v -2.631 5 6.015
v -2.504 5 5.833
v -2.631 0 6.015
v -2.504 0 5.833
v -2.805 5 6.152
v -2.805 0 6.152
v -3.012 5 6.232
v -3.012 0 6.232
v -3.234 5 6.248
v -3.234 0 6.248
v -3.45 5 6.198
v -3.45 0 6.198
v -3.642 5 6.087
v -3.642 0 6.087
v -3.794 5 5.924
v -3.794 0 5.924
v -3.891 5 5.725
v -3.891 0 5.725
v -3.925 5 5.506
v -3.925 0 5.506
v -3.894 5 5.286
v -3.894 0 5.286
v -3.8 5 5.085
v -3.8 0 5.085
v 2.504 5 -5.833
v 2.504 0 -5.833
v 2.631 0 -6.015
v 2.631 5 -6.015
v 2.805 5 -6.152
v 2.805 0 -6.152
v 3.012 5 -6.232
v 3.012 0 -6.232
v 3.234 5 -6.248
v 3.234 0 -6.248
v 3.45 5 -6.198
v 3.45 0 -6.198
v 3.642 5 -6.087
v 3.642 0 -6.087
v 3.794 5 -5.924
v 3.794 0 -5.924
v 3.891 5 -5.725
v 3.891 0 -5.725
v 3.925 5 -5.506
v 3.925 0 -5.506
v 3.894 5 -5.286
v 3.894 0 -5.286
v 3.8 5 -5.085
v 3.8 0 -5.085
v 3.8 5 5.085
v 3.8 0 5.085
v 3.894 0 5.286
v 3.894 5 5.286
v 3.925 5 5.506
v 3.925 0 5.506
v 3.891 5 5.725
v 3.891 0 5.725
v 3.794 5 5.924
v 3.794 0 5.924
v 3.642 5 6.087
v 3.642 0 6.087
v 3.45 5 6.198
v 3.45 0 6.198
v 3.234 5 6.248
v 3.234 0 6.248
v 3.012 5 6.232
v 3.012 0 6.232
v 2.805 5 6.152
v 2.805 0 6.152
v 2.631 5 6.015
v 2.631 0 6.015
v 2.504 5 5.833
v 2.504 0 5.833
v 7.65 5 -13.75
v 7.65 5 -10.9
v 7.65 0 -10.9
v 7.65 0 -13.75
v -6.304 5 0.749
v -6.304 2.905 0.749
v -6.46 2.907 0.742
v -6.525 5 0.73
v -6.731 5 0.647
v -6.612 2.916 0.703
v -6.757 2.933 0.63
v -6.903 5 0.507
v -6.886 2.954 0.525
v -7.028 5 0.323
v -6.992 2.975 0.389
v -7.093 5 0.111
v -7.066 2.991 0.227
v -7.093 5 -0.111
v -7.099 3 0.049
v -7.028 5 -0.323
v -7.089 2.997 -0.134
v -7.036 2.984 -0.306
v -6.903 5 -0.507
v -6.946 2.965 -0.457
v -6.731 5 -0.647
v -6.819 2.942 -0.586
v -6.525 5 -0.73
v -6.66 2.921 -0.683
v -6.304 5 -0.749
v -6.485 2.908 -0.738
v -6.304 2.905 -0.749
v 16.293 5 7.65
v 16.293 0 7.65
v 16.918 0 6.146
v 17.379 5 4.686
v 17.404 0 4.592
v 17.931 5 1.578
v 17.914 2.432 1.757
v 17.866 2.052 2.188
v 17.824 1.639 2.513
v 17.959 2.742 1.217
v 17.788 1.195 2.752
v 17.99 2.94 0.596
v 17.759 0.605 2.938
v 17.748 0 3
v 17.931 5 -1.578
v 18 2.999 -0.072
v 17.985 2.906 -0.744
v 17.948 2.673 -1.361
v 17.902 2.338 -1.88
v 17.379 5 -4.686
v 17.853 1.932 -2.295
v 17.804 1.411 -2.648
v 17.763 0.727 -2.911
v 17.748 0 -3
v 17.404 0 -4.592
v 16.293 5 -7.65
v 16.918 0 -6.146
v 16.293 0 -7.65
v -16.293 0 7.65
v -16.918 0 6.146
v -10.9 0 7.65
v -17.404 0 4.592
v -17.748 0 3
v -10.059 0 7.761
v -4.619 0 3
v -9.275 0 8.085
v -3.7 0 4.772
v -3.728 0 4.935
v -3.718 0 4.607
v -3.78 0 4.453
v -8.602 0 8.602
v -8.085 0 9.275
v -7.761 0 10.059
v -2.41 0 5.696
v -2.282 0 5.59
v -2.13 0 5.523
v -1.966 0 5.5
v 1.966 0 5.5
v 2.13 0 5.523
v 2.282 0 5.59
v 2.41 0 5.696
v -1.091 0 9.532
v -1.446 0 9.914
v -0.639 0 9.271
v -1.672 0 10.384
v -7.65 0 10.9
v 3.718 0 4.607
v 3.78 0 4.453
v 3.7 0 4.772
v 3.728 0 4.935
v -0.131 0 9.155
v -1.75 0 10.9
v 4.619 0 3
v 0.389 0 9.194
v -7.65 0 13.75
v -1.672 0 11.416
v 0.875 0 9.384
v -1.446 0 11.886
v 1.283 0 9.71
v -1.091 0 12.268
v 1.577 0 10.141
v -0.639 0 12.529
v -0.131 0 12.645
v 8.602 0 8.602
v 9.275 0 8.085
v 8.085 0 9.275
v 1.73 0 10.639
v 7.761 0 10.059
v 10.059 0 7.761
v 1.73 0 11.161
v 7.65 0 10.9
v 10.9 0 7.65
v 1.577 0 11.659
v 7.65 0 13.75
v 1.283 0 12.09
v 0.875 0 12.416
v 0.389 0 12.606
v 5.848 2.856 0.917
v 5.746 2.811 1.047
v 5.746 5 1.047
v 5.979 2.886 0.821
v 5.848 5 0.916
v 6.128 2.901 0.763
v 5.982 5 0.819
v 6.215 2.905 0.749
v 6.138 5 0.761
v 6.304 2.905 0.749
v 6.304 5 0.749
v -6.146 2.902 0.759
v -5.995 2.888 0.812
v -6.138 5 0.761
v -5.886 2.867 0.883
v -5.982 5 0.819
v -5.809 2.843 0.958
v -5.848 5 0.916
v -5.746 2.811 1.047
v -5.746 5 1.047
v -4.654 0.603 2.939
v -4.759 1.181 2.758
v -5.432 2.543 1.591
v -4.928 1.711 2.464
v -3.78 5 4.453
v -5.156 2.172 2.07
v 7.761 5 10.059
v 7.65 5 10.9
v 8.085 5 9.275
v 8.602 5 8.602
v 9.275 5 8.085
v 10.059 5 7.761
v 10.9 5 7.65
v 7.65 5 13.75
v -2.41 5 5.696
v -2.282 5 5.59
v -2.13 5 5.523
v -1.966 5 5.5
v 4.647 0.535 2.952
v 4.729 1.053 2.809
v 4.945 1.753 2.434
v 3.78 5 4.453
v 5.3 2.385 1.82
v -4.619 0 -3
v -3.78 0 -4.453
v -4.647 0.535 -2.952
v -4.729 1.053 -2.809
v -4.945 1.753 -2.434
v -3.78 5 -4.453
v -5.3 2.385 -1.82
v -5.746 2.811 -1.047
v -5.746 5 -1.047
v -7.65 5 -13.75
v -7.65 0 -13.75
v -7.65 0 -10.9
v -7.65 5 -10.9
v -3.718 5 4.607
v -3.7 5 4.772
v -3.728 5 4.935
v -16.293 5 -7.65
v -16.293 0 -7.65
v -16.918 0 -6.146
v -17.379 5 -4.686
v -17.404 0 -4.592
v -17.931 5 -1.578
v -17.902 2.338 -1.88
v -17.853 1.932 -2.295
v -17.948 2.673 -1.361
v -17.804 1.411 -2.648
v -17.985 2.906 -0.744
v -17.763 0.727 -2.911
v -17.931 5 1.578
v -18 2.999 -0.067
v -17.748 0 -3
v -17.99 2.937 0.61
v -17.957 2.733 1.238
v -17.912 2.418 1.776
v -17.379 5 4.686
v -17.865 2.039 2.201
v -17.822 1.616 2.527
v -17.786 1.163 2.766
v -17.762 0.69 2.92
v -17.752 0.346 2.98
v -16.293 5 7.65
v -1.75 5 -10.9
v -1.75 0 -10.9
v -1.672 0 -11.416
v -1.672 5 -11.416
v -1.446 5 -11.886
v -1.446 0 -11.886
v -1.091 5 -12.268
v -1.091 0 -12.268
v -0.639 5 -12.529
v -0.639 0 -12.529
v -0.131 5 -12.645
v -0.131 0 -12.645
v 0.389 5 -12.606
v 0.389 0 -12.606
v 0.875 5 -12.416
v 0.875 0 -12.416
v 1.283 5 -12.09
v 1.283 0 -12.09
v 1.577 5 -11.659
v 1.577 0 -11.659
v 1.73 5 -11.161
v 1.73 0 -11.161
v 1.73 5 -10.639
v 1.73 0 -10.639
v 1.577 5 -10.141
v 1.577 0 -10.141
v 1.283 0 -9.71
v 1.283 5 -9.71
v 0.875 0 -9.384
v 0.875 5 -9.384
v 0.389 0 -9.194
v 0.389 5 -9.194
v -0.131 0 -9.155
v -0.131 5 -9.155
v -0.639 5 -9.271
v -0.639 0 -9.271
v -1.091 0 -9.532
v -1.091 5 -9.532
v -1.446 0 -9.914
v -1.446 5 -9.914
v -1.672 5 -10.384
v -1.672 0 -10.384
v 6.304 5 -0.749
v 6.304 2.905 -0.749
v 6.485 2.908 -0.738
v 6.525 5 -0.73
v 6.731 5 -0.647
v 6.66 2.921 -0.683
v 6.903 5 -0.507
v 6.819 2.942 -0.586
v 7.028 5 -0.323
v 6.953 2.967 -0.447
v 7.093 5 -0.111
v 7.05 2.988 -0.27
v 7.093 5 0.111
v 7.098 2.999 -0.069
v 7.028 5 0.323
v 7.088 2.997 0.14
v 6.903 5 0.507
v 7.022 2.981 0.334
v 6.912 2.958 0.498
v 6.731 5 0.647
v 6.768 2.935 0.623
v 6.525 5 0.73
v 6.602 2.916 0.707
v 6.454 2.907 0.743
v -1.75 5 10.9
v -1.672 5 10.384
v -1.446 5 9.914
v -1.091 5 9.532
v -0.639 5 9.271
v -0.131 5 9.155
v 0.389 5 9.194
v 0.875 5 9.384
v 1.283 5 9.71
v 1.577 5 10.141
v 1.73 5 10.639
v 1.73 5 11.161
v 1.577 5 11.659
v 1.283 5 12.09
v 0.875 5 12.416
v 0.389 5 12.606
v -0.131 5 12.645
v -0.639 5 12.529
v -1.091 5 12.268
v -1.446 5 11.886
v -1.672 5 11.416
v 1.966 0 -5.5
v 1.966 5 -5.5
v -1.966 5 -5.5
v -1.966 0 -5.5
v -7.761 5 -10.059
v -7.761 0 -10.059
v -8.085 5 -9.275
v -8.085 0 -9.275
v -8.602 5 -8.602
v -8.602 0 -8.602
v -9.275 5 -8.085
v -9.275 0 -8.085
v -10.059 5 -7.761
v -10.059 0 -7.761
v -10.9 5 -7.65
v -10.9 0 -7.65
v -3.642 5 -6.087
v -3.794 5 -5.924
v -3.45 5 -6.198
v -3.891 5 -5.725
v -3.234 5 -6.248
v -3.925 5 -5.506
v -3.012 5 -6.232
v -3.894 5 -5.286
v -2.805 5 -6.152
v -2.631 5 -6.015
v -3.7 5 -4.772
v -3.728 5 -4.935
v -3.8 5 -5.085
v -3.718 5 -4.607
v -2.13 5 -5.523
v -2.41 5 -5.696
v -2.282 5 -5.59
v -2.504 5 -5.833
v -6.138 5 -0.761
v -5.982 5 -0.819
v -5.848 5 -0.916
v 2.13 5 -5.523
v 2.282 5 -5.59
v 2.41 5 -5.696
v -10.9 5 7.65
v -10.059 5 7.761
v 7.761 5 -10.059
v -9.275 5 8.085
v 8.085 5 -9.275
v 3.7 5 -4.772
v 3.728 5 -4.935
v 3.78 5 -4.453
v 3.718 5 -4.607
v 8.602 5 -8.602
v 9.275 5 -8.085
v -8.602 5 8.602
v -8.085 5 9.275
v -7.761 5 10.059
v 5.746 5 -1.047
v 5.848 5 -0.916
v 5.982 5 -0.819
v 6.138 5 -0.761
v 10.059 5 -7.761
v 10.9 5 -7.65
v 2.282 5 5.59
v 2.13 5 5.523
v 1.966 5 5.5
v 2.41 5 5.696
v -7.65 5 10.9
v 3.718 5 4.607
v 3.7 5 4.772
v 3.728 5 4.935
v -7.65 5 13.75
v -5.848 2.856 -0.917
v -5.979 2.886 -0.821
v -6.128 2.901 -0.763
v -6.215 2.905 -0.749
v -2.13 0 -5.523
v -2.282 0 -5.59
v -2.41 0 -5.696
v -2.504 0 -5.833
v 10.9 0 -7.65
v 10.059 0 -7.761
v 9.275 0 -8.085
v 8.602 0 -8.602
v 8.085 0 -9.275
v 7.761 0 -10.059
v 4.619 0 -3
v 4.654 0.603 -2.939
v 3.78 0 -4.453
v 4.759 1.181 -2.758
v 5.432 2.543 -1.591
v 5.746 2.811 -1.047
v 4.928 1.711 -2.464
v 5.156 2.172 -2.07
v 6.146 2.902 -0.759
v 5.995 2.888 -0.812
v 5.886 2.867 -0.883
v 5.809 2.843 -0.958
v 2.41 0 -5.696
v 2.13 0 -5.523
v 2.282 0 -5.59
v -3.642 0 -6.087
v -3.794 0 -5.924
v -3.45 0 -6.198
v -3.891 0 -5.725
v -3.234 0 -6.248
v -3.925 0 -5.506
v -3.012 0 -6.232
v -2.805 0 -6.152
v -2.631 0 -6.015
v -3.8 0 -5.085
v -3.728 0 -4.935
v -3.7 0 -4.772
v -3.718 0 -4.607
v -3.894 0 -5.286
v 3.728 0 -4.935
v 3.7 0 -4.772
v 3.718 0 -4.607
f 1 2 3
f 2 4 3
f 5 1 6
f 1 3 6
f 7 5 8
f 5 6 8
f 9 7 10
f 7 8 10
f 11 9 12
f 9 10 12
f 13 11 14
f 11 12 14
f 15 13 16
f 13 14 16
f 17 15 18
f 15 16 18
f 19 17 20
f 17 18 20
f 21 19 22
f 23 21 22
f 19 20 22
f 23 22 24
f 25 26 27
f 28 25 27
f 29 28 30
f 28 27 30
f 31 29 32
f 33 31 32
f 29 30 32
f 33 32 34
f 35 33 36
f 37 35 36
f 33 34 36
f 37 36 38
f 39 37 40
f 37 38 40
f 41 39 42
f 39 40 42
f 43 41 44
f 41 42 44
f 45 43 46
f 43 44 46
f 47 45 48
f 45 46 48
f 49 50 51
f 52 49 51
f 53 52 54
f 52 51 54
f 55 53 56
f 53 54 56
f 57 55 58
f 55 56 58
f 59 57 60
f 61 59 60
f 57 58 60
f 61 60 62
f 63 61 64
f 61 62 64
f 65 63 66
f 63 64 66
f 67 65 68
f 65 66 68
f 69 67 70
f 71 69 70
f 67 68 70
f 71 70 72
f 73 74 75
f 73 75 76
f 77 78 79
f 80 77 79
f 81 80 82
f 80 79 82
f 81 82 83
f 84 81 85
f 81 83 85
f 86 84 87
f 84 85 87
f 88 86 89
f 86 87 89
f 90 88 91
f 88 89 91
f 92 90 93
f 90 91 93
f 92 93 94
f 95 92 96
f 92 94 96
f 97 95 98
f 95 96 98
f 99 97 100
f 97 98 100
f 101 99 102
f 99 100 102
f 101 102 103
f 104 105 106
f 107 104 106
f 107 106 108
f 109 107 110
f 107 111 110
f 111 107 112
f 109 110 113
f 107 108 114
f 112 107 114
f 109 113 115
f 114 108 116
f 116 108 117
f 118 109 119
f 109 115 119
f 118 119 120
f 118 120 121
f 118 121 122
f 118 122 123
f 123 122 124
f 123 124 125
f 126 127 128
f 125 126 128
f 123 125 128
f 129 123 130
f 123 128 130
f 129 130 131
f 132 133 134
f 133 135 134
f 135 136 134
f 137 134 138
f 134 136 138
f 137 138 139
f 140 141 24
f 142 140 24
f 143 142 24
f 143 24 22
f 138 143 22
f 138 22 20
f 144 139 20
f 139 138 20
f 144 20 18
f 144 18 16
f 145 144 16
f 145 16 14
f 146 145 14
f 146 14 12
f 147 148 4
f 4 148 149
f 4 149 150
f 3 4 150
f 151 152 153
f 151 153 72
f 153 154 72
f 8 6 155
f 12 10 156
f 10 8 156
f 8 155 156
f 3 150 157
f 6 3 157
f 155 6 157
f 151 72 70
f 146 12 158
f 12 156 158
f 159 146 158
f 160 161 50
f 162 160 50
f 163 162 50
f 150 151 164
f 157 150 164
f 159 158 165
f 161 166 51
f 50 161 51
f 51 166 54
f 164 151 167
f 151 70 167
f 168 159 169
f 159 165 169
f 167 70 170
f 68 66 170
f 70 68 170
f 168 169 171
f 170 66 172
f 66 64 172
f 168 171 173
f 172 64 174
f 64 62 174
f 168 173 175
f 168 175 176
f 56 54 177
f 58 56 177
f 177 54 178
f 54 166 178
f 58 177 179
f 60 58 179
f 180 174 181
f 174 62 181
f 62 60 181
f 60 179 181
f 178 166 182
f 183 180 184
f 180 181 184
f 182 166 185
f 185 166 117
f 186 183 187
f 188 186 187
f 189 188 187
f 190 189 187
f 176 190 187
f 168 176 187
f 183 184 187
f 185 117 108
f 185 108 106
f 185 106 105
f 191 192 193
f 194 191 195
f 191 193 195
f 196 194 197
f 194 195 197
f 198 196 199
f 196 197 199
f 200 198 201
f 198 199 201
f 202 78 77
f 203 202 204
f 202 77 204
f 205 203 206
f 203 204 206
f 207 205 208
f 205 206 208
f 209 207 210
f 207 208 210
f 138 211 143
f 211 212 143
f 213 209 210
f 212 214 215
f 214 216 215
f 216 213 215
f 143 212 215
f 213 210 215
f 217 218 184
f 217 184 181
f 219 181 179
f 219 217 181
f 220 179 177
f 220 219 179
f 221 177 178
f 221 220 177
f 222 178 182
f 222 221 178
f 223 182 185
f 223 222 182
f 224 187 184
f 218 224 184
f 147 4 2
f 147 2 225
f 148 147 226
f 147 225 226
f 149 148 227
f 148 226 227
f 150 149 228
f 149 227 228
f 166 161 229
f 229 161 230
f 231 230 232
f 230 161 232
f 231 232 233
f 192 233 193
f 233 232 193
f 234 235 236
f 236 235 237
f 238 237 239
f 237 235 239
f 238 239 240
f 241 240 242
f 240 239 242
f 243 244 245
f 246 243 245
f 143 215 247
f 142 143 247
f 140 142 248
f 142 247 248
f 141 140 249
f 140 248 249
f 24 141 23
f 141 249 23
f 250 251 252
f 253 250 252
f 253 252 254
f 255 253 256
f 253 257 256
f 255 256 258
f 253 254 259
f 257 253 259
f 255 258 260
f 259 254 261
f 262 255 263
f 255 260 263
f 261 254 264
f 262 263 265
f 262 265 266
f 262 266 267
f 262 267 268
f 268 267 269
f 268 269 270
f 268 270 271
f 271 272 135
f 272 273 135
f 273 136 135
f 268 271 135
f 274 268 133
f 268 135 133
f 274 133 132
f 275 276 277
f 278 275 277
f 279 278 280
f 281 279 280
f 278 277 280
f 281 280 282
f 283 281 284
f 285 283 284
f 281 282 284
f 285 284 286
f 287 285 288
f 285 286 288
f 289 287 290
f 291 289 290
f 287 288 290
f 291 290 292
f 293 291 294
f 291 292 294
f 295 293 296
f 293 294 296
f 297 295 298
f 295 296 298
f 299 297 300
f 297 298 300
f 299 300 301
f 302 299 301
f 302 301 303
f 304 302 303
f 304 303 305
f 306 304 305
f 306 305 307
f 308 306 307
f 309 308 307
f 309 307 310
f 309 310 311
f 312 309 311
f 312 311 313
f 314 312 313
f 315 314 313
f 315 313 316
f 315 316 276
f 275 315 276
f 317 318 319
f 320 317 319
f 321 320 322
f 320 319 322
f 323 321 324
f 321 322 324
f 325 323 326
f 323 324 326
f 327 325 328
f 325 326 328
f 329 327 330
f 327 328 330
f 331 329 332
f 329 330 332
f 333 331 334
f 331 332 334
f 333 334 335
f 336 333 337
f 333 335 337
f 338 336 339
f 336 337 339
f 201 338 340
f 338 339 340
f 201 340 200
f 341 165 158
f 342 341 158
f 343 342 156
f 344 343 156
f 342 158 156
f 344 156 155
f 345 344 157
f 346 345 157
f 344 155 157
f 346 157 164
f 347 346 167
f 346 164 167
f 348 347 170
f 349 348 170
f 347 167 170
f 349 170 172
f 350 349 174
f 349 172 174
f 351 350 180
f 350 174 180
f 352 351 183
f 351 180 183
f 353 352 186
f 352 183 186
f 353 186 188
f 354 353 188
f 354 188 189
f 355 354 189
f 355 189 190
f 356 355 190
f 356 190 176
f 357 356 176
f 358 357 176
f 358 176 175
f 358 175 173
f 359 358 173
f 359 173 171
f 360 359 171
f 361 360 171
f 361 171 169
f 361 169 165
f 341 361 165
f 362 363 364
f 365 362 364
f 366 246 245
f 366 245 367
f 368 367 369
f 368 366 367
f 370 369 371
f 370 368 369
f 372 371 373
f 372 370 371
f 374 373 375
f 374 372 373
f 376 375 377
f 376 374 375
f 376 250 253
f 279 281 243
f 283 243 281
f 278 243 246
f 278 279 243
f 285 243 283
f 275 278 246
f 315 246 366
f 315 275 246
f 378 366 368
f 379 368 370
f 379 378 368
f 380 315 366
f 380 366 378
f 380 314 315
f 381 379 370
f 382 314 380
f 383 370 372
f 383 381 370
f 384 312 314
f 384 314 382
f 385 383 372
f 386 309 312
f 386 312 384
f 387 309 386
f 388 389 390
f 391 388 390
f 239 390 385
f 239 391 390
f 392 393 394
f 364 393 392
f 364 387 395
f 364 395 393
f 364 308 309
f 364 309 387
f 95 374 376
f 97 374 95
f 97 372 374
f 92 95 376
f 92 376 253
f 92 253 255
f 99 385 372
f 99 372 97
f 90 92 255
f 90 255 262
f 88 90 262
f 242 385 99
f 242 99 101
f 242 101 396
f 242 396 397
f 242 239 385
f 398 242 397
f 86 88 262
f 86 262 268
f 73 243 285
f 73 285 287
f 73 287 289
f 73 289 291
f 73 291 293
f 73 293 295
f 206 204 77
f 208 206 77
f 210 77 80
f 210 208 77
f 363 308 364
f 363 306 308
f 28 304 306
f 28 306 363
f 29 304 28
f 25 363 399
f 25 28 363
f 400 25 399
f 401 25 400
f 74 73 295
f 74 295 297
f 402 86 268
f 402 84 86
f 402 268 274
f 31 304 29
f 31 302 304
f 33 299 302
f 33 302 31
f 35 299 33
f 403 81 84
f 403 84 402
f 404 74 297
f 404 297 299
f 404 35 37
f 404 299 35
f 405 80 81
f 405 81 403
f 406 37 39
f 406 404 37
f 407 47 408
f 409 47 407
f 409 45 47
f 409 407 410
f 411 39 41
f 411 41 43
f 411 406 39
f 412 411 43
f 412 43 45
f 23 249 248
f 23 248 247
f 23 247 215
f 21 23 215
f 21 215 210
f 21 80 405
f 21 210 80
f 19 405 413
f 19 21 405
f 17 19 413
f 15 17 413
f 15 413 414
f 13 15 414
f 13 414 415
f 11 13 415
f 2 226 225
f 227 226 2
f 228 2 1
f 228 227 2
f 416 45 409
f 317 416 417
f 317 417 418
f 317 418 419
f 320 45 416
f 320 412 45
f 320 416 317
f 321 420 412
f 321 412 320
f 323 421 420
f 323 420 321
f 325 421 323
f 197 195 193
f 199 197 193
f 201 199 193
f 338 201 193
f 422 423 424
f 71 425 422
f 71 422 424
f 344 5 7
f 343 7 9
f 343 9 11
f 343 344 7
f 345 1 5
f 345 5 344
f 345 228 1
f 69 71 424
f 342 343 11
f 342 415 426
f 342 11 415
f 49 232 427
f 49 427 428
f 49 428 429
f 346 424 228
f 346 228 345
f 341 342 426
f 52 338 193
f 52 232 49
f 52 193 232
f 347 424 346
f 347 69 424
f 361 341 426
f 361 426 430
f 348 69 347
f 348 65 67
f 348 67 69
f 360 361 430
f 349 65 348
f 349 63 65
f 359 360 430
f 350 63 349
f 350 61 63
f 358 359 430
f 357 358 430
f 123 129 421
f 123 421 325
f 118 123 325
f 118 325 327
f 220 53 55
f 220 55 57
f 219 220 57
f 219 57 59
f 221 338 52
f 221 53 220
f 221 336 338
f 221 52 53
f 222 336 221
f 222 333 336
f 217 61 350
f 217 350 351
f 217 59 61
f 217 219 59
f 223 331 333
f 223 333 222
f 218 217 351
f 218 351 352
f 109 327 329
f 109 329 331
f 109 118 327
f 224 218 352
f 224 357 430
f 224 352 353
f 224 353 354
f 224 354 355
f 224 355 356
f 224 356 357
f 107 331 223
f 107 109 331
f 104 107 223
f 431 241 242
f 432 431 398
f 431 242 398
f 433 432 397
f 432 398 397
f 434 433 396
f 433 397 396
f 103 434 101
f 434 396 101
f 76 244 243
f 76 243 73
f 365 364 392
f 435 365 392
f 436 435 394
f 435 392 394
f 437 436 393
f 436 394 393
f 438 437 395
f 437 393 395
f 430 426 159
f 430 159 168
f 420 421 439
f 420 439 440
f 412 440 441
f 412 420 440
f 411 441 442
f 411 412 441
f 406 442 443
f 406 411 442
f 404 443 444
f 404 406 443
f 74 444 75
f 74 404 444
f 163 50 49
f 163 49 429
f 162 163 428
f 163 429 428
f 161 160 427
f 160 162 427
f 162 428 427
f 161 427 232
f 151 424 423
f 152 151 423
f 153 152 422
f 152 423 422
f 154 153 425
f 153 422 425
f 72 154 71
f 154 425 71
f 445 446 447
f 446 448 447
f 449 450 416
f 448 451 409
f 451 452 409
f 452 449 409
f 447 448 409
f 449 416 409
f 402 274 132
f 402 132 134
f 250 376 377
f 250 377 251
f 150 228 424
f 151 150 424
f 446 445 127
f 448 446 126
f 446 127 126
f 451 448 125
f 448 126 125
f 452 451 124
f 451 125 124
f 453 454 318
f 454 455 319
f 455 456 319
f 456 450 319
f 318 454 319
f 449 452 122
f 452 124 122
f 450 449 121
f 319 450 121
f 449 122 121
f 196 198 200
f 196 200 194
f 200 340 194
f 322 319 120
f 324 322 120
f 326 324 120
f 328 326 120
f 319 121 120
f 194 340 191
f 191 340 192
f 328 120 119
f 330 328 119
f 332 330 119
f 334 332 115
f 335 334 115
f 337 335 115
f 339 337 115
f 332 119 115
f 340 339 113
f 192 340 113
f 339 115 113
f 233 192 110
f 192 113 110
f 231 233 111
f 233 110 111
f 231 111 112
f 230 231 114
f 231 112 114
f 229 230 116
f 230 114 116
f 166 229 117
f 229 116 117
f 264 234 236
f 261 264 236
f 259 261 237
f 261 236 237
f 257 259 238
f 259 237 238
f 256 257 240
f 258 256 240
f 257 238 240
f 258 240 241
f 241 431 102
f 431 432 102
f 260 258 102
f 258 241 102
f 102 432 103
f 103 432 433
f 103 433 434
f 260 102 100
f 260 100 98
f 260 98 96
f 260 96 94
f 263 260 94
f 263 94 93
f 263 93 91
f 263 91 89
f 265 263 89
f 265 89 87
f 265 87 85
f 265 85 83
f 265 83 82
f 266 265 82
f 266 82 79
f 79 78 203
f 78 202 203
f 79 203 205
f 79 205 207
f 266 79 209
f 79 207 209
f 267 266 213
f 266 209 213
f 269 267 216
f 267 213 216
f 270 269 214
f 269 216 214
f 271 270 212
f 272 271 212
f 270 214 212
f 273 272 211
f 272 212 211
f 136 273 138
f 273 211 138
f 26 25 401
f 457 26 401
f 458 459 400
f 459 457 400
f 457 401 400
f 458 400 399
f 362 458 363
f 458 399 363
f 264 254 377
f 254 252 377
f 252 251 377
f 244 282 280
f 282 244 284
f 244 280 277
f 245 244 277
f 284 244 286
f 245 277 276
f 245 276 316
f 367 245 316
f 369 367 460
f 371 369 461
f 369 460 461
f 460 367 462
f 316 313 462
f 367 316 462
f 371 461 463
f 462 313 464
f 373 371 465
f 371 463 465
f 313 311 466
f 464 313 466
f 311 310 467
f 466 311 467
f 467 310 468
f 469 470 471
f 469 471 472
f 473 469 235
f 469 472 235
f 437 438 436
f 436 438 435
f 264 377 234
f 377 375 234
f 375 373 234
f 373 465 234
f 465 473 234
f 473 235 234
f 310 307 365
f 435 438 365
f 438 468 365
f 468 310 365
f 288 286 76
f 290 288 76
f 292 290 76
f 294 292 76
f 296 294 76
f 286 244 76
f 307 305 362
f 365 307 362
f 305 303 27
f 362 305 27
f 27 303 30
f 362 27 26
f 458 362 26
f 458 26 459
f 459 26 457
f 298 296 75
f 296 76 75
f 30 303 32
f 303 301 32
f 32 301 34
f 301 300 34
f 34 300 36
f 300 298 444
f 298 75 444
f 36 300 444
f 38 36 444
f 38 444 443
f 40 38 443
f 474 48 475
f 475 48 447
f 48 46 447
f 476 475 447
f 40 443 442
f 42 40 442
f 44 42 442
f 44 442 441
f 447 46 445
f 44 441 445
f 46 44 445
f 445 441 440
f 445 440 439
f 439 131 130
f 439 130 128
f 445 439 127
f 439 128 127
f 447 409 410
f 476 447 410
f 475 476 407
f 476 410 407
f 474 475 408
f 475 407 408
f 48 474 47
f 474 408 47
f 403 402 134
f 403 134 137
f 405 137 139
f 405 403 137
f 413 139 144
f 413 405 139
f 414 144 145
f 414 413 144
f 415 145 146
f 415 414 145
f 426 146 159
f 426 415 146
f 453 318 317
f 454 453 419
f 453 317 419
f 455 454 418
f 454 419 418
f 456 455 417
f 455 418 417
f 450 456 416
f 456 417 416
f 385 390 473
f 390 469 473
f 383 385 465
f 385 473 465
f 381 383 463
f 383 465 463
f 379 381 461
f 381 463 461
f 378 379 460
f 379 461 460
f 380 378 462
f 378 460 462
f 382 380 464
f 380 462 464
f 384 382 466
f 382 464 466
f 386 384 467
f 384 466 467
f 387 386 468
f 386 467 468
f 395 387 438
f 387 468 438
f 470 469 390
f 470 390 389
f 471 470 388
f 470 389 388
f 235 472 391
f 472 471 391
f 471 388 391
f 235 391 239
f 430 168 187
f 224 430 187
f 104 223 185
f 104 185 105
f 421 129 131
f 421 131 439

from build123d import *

# Parameters (mm, degrees)
SKIZZE1_R                            = 18
AUFSATZ_LINEAR_AUSTRAGEN1_DEPTH      = 5
SCHNITT_LINEAR_AUSTRAGEN1_DEPTH      = 26.942243542
SCHNITT_LINEAR_AUSTRAGEN1_DEPTH_BACK = 26.942243542
SKIZZE2_OUTSIDE_W                    = 48.232
SKIZZE2_OUTSIDE_H                    = 48.232
SKIZZE2_OUTSIDE_W_2                  = 36
SKIZZE2_OUTSIDE_H_2                  = 27.5
F_3_5_3_5_DURCHMESSER_BOHRUNG1_D     = 3.5
SCHNITT_LINEAR_AUSTRAGEN2_DEPTH      = 24.196174254
SCHNITT_LINEAR_AUSTRAGEN3_DEPTH      = 24.196174254
SKIZZE7_R                            = 3
SCHNITT_LINEAR_AUSTRAGEN4_DEPTH      = 22.5
F_1_5_1_5_DURCHMESSER_BOHRUNG1_D     = 1.5
VERRUNDUNG1_R                        = 0.6


with BuildPart() as part:
    # Skizze1 → Aufsatz-Linear austragen1 (new body)
    with BuildSketch(Plane(origin=(0, 0, 0), x_dir=(1, 0, 0), z_dir=(0, 1, 0))):
        with Locations(Location((0, 0, 0), (0, 0, 270))):
            Circle(SKIZZE1_R)
    extrude(amount=AUFSATZ_LINEAR_AUSTRAGEN1_DEPTH)

    # Skizze2 outside → Schnitt-Linear austragen1 (cut, two sides: drawn at the far end of the back side and taken through both)
    with BuildSketch(Plane(origin=(0, 5, 0), x_dir=(1, 0, 0), z_dir=(0, 1, 0)).offset(-SCHNITT_LINEAR_AUSTRAGEN1_DEPTH_BACK)):
        Rectangle(SKIZZE2_OUTSIDE_W, SKIZZE2_OUTSIDE_H)
        Rectangle(SKIZZE2_OUTSIDE_W_2, SKIZZE2_OUTSIDE_H_2, mode=Mode.SUBTRACT)
    extrude(amount=SCHNITT_LINEAR_AUSTRAGEN1_DEPTH + SCHNITT_LINEAR_AUSTRAGEN1_DEPTH_BACK, mode=Mode.SUBTRACT)

    # Ø3.5 (3.5) Durchmesser Bohrung1 (through all)
    with Locations(Plane(origin=(0, 5, 0), x_dir=(1, 0, 0), z_dir=(0, 1, 0))):
        with Locations((0, 10.9), (0, -10.9)):
            Hole(F_3_5_3_5_DURCHMESSER_BOHRUNG1_D / 2)

    # Skizze5 → Schnitt-Linear austragen2 (cut, through all)
    with BuildSketch(Plane(origin=(0, 5, 0), x_dir=(1, 0, 0), z_dir=(0, 1, 0))):
        with BuildLine():
            Line((-10.9, 7.65), (-17.888484908, 7.65))
            Line((-17.888484908, 7.65), (-17.888484908, 14.15))
            Line((-17.888484908, 14.15), (-7.65, 14.15))
            Line((-7.65, 14.15), (-7.65, 10.9))
            ThreePointArc((-7.65, 10.9), (-8.601902961, 8.601902961), (-10.9, 7.65))
        make_face()
        with BuildLine():
            Line((17.888484908, 14.15), (17.888484908, 7.65))
            Line((17.888484908, 7.65), (10.9, 7.65))
            ThreePointArc((10.9, 7.65), (8.601902961, 8.601902961), (7.65, 10.9))
            Line((7.65, 10.9), (7.65, 14.15))
            Line((7.65, 14.15), (17.888484908, 14.15))
        make_face()
        with BuildLine():
            Line((-17.888484908, -14.15), (-17.888484908, -7.65))
            Line((-17.888484908, -7.65), (-10.9, -7.65))
            ThreePointArc((-10.9, -7.65), (-8.601902961, -8.601902961), (-7.65, -10.9))
            Line((-7.65, -10.9), (-7.65, -14.15))
            Line((-7.65, -14.15), (-17.888484908, -14.15))
        make_face()
        with BuildLine():
            Line((10.9, -7.65), (17.888484908, -7.65))
            Line((17.888484908, -7.65), (17.888484908, -14.15))
            Line((17.888484908, -14.15), (7.65, -14.15))
            Line((7.65, -14.15), (7.65, -10.9))
            ThreePointArc((7.65, -10.9), (8.601902961, -8.601902961), (10.9, -7.65))
        make_face()
    extrude(amount=-SCHNITT_LINEAR_AUSTRAGEN2_DEPTH, mode=Mode.SUBTRACT)

    # Skizze6 → Schnitt-Linear austragen3 (cut, through all)
    with BuildSketch(Plane(origin=(0, 5, 0), x_dir=(1, 0, 0), z_dir=(0, 1, 0))):
        Polygon((6.350852961, 0), (3.175426481, 5.5), (-3.175426481, 5.5), (-6.350852961, 0), (-3.175426481, -5.5), (3.175426481, -5.5), align=None)
    extrude(amount=-SCHNITT_LINEAR_AUSTRAGEN3_DEPTH, mode=Mode.SUBTRACT)

    # Skizze7 → Schnitt-Linear austragen4 (cut, symmetric)
    with BuildSketch(Plane(origin=(0, 0, 0), x_dir=(0, 0, -1), z_dir=(1, 0, 0))):
        Circle(SKIZZE7_R)
    extrude(amount=SCHNITT_LINEAR_AUSTRAGEN4_DEPTH, both=True, mode=Mode.SUBTRACT)

    # Ø1.5 (1.5) Durchmesser Bohrung1 (through all)
    with Locations(Plane(origin=(0, 5, 0), x_dir=(1, 0, 0), z_dir=(0, 1, 0))):
        with Locations((3.175426481, 5.5), (-3.175426481, 5.5), (-6.350852961, 0), (-3.175426481, -5.5), (3.175426481, -5.5), (6.350852961, 0)):
            Hole(F_1_5_1_5_DURCHMESSER_BOHRUNG1_D / 2)

    # Verrundung1
    # the kernel refuses this fillet: 0.6 mm, written as the material it takes off along each edge
    with BuildSketch(Plane(origin=(-5.975852961, 6.148346656, -0.649519053), x_dir=(0.4999999999999993, 0, -0.8660254037844392), z_dir=(0, -1, 0))) as verrundung1_piece_1:
        with BuildLine():
            CenterArc((0.459338662, -0.6), VERRUNDUNG1_R, 90, 63.612200035)
            ThreePointArc((-0.078145188, -0.333333333), (-0.019797593, -0.171185412), (0, 0))
            Line((0, 0), (0.459338662, 0))
        make_face()
    extrude(amount=4.367849683, mode=Mode.SUBTRACT)
    with BuildSketch(Plane(origin=(-5.975852961, 6.148346656, 0.649519053), x_dir=(0.5000000000000006, 0, 0.8660254037844383), z_dir=(0, -1, 0)), Plane(origin=(5.975852961, 6.148346656, -0.649519053), x_dir=(-0.5000000000000003, 0, -0.8660254037844385), z_dir=(0, -1, 0))) as verrundung1_piece_2:
        with BuildLine():
            CenterArc((0.459338662, 0.6), VERRUNDUNG1_R, 206.387799965, 63.612200035)
            ThreePointArc((-0.078145188, 0.333333333), (-0.019797593, 0.171185412), (0, 0))
            Line((0, 0), (0.459338662, 0))
        make_face()
    extrude(amount=4.367849683, mode=Mode.SUBTRACT)
    with BuildSketch(Plane(origin=(-3.550426481, 6.148346656, 4.850480947), x_dir=(-0.49999999999999917, 0, -0.866025403784439), z_dir=(0, -1, 0)), Plane(origin=(3.550426481, 6.148346656, -4.850480947), x_dir=(0.5000000000000006, 0, 0.8660254037844383), z_dir=(0, -1, 0))) as verrundung1_piece_3:
        with BuildLine():
            CenterArc((0.459338662, -0.6), VERRUNDUNG1_R, 90, 63.612200058)
            ThreePointArc((-0.078145188, -0.333333334), (-0.019797593, -0.171185412), (0, 0))
            Line((0, 0), (0.459338662, 0))
        make_face()
    extrude(amount=7.296693312, mode=Mode.SUBTRACT)
    with BuildSketch(Plane(origin=(-2.425426481, 6.148346656, 5.5), x_dir=(-0.22824721632736633, 0, 0.9736032088272966), z_dir=(0, -1, 0)), Plane(origin=(2.425426481, 6.148346656, -5.5), x_dir=(0.22824721632736567, 0, -0.9736032088272967), z_dir=(0, -1, 0))) as verrundung1_piece_4:
        with BuildLine():
            CenterArc((0.479319154, -0.584161925), VERRUNDUNG1_R, 103.193899981, 63.612200039)
            Line((-0.104842771, -0.447213595), (0, 0))
            ThreePointArc((0, 0), (0.171185412, -0.019797593), (0.342370824, 0))
        make_face()
    extrude(amount=7.296693311, mode=Mode.SUBTRACT)
    with BuildSketch(Plane(origin=(2.425426481, 6.148346656, 5.5), x_dir=(-1, 0, 0), z_dir=(0, -1, 0)), Plane(origin=(-2.425426481, 6.148346656, -5.5), x_dir=(1, 0, 0), z_dir=(0, -1, 0))) as verrundung1_piece_5:
        with BuildLine():
            CenterArc((0.459338662, -0.6), VERRUNDUNG1_R, 90, 63.612200039)
            ThreePointArc((-0.078145188, -0.333333333), (-0.019797593, -0.171185412), (0, 0))
            Line((0, 0), (0.459338662, 0))
        make_face()
    extrude(amount=7.296693311, mode=Mode.SUBTRACT)
    with BuildSketch(Plane(origin=(3.550426481, 6.148346656, 4.850480947), x_dir=(0.7290415041794372, 0, 0.6844694917845379), z_dir=(0, -1, 0)), Plane(origin=(-3.550426481, 6.148346656, -4.850480947), x_dir=(-0.729041504179436, 0, -0.6844694917845393), z_dir=(0, -1, 0))) as verrundung1_piece_6:
        with BuildLine():
            CenterArc((0.479319154, -0.584161925), VERRUNDUNG1_R, 103.193899986, 63.612200058)
            Line((-0.104842771, -0.447213596), (0, 0))
            ThreePointArc((0, 0), (0.171185412, -0.019797593), (0.342370825, 0))
        make_face()
    extrude(amount=7.296693312, mode=Mode.SUBTRACT)
    with BuildSketch(Plane(origin=(5.975852961, 6.148346656, 0.649519053), x_dir=(0.9572887202373949, 0, 0.28913371665416454), z_dir=(0, -1, 0))) as verrundung1_piece_7:
        with BuildLine():
            CenterArc((0.479319154, 0.584161925), VERRUNDUNG1_R, 193.193899985, 63.612200035)
            Line((-0.104842771, 0.447213595), (0, 0))
            ThreePointArc((0, 0), (0.171185412, 0.019797593), (0.342370824, 0))
        make_face()
    extrude(amount=4.367849683, mode=Mode.SUBTRACT)


solid = part.part
